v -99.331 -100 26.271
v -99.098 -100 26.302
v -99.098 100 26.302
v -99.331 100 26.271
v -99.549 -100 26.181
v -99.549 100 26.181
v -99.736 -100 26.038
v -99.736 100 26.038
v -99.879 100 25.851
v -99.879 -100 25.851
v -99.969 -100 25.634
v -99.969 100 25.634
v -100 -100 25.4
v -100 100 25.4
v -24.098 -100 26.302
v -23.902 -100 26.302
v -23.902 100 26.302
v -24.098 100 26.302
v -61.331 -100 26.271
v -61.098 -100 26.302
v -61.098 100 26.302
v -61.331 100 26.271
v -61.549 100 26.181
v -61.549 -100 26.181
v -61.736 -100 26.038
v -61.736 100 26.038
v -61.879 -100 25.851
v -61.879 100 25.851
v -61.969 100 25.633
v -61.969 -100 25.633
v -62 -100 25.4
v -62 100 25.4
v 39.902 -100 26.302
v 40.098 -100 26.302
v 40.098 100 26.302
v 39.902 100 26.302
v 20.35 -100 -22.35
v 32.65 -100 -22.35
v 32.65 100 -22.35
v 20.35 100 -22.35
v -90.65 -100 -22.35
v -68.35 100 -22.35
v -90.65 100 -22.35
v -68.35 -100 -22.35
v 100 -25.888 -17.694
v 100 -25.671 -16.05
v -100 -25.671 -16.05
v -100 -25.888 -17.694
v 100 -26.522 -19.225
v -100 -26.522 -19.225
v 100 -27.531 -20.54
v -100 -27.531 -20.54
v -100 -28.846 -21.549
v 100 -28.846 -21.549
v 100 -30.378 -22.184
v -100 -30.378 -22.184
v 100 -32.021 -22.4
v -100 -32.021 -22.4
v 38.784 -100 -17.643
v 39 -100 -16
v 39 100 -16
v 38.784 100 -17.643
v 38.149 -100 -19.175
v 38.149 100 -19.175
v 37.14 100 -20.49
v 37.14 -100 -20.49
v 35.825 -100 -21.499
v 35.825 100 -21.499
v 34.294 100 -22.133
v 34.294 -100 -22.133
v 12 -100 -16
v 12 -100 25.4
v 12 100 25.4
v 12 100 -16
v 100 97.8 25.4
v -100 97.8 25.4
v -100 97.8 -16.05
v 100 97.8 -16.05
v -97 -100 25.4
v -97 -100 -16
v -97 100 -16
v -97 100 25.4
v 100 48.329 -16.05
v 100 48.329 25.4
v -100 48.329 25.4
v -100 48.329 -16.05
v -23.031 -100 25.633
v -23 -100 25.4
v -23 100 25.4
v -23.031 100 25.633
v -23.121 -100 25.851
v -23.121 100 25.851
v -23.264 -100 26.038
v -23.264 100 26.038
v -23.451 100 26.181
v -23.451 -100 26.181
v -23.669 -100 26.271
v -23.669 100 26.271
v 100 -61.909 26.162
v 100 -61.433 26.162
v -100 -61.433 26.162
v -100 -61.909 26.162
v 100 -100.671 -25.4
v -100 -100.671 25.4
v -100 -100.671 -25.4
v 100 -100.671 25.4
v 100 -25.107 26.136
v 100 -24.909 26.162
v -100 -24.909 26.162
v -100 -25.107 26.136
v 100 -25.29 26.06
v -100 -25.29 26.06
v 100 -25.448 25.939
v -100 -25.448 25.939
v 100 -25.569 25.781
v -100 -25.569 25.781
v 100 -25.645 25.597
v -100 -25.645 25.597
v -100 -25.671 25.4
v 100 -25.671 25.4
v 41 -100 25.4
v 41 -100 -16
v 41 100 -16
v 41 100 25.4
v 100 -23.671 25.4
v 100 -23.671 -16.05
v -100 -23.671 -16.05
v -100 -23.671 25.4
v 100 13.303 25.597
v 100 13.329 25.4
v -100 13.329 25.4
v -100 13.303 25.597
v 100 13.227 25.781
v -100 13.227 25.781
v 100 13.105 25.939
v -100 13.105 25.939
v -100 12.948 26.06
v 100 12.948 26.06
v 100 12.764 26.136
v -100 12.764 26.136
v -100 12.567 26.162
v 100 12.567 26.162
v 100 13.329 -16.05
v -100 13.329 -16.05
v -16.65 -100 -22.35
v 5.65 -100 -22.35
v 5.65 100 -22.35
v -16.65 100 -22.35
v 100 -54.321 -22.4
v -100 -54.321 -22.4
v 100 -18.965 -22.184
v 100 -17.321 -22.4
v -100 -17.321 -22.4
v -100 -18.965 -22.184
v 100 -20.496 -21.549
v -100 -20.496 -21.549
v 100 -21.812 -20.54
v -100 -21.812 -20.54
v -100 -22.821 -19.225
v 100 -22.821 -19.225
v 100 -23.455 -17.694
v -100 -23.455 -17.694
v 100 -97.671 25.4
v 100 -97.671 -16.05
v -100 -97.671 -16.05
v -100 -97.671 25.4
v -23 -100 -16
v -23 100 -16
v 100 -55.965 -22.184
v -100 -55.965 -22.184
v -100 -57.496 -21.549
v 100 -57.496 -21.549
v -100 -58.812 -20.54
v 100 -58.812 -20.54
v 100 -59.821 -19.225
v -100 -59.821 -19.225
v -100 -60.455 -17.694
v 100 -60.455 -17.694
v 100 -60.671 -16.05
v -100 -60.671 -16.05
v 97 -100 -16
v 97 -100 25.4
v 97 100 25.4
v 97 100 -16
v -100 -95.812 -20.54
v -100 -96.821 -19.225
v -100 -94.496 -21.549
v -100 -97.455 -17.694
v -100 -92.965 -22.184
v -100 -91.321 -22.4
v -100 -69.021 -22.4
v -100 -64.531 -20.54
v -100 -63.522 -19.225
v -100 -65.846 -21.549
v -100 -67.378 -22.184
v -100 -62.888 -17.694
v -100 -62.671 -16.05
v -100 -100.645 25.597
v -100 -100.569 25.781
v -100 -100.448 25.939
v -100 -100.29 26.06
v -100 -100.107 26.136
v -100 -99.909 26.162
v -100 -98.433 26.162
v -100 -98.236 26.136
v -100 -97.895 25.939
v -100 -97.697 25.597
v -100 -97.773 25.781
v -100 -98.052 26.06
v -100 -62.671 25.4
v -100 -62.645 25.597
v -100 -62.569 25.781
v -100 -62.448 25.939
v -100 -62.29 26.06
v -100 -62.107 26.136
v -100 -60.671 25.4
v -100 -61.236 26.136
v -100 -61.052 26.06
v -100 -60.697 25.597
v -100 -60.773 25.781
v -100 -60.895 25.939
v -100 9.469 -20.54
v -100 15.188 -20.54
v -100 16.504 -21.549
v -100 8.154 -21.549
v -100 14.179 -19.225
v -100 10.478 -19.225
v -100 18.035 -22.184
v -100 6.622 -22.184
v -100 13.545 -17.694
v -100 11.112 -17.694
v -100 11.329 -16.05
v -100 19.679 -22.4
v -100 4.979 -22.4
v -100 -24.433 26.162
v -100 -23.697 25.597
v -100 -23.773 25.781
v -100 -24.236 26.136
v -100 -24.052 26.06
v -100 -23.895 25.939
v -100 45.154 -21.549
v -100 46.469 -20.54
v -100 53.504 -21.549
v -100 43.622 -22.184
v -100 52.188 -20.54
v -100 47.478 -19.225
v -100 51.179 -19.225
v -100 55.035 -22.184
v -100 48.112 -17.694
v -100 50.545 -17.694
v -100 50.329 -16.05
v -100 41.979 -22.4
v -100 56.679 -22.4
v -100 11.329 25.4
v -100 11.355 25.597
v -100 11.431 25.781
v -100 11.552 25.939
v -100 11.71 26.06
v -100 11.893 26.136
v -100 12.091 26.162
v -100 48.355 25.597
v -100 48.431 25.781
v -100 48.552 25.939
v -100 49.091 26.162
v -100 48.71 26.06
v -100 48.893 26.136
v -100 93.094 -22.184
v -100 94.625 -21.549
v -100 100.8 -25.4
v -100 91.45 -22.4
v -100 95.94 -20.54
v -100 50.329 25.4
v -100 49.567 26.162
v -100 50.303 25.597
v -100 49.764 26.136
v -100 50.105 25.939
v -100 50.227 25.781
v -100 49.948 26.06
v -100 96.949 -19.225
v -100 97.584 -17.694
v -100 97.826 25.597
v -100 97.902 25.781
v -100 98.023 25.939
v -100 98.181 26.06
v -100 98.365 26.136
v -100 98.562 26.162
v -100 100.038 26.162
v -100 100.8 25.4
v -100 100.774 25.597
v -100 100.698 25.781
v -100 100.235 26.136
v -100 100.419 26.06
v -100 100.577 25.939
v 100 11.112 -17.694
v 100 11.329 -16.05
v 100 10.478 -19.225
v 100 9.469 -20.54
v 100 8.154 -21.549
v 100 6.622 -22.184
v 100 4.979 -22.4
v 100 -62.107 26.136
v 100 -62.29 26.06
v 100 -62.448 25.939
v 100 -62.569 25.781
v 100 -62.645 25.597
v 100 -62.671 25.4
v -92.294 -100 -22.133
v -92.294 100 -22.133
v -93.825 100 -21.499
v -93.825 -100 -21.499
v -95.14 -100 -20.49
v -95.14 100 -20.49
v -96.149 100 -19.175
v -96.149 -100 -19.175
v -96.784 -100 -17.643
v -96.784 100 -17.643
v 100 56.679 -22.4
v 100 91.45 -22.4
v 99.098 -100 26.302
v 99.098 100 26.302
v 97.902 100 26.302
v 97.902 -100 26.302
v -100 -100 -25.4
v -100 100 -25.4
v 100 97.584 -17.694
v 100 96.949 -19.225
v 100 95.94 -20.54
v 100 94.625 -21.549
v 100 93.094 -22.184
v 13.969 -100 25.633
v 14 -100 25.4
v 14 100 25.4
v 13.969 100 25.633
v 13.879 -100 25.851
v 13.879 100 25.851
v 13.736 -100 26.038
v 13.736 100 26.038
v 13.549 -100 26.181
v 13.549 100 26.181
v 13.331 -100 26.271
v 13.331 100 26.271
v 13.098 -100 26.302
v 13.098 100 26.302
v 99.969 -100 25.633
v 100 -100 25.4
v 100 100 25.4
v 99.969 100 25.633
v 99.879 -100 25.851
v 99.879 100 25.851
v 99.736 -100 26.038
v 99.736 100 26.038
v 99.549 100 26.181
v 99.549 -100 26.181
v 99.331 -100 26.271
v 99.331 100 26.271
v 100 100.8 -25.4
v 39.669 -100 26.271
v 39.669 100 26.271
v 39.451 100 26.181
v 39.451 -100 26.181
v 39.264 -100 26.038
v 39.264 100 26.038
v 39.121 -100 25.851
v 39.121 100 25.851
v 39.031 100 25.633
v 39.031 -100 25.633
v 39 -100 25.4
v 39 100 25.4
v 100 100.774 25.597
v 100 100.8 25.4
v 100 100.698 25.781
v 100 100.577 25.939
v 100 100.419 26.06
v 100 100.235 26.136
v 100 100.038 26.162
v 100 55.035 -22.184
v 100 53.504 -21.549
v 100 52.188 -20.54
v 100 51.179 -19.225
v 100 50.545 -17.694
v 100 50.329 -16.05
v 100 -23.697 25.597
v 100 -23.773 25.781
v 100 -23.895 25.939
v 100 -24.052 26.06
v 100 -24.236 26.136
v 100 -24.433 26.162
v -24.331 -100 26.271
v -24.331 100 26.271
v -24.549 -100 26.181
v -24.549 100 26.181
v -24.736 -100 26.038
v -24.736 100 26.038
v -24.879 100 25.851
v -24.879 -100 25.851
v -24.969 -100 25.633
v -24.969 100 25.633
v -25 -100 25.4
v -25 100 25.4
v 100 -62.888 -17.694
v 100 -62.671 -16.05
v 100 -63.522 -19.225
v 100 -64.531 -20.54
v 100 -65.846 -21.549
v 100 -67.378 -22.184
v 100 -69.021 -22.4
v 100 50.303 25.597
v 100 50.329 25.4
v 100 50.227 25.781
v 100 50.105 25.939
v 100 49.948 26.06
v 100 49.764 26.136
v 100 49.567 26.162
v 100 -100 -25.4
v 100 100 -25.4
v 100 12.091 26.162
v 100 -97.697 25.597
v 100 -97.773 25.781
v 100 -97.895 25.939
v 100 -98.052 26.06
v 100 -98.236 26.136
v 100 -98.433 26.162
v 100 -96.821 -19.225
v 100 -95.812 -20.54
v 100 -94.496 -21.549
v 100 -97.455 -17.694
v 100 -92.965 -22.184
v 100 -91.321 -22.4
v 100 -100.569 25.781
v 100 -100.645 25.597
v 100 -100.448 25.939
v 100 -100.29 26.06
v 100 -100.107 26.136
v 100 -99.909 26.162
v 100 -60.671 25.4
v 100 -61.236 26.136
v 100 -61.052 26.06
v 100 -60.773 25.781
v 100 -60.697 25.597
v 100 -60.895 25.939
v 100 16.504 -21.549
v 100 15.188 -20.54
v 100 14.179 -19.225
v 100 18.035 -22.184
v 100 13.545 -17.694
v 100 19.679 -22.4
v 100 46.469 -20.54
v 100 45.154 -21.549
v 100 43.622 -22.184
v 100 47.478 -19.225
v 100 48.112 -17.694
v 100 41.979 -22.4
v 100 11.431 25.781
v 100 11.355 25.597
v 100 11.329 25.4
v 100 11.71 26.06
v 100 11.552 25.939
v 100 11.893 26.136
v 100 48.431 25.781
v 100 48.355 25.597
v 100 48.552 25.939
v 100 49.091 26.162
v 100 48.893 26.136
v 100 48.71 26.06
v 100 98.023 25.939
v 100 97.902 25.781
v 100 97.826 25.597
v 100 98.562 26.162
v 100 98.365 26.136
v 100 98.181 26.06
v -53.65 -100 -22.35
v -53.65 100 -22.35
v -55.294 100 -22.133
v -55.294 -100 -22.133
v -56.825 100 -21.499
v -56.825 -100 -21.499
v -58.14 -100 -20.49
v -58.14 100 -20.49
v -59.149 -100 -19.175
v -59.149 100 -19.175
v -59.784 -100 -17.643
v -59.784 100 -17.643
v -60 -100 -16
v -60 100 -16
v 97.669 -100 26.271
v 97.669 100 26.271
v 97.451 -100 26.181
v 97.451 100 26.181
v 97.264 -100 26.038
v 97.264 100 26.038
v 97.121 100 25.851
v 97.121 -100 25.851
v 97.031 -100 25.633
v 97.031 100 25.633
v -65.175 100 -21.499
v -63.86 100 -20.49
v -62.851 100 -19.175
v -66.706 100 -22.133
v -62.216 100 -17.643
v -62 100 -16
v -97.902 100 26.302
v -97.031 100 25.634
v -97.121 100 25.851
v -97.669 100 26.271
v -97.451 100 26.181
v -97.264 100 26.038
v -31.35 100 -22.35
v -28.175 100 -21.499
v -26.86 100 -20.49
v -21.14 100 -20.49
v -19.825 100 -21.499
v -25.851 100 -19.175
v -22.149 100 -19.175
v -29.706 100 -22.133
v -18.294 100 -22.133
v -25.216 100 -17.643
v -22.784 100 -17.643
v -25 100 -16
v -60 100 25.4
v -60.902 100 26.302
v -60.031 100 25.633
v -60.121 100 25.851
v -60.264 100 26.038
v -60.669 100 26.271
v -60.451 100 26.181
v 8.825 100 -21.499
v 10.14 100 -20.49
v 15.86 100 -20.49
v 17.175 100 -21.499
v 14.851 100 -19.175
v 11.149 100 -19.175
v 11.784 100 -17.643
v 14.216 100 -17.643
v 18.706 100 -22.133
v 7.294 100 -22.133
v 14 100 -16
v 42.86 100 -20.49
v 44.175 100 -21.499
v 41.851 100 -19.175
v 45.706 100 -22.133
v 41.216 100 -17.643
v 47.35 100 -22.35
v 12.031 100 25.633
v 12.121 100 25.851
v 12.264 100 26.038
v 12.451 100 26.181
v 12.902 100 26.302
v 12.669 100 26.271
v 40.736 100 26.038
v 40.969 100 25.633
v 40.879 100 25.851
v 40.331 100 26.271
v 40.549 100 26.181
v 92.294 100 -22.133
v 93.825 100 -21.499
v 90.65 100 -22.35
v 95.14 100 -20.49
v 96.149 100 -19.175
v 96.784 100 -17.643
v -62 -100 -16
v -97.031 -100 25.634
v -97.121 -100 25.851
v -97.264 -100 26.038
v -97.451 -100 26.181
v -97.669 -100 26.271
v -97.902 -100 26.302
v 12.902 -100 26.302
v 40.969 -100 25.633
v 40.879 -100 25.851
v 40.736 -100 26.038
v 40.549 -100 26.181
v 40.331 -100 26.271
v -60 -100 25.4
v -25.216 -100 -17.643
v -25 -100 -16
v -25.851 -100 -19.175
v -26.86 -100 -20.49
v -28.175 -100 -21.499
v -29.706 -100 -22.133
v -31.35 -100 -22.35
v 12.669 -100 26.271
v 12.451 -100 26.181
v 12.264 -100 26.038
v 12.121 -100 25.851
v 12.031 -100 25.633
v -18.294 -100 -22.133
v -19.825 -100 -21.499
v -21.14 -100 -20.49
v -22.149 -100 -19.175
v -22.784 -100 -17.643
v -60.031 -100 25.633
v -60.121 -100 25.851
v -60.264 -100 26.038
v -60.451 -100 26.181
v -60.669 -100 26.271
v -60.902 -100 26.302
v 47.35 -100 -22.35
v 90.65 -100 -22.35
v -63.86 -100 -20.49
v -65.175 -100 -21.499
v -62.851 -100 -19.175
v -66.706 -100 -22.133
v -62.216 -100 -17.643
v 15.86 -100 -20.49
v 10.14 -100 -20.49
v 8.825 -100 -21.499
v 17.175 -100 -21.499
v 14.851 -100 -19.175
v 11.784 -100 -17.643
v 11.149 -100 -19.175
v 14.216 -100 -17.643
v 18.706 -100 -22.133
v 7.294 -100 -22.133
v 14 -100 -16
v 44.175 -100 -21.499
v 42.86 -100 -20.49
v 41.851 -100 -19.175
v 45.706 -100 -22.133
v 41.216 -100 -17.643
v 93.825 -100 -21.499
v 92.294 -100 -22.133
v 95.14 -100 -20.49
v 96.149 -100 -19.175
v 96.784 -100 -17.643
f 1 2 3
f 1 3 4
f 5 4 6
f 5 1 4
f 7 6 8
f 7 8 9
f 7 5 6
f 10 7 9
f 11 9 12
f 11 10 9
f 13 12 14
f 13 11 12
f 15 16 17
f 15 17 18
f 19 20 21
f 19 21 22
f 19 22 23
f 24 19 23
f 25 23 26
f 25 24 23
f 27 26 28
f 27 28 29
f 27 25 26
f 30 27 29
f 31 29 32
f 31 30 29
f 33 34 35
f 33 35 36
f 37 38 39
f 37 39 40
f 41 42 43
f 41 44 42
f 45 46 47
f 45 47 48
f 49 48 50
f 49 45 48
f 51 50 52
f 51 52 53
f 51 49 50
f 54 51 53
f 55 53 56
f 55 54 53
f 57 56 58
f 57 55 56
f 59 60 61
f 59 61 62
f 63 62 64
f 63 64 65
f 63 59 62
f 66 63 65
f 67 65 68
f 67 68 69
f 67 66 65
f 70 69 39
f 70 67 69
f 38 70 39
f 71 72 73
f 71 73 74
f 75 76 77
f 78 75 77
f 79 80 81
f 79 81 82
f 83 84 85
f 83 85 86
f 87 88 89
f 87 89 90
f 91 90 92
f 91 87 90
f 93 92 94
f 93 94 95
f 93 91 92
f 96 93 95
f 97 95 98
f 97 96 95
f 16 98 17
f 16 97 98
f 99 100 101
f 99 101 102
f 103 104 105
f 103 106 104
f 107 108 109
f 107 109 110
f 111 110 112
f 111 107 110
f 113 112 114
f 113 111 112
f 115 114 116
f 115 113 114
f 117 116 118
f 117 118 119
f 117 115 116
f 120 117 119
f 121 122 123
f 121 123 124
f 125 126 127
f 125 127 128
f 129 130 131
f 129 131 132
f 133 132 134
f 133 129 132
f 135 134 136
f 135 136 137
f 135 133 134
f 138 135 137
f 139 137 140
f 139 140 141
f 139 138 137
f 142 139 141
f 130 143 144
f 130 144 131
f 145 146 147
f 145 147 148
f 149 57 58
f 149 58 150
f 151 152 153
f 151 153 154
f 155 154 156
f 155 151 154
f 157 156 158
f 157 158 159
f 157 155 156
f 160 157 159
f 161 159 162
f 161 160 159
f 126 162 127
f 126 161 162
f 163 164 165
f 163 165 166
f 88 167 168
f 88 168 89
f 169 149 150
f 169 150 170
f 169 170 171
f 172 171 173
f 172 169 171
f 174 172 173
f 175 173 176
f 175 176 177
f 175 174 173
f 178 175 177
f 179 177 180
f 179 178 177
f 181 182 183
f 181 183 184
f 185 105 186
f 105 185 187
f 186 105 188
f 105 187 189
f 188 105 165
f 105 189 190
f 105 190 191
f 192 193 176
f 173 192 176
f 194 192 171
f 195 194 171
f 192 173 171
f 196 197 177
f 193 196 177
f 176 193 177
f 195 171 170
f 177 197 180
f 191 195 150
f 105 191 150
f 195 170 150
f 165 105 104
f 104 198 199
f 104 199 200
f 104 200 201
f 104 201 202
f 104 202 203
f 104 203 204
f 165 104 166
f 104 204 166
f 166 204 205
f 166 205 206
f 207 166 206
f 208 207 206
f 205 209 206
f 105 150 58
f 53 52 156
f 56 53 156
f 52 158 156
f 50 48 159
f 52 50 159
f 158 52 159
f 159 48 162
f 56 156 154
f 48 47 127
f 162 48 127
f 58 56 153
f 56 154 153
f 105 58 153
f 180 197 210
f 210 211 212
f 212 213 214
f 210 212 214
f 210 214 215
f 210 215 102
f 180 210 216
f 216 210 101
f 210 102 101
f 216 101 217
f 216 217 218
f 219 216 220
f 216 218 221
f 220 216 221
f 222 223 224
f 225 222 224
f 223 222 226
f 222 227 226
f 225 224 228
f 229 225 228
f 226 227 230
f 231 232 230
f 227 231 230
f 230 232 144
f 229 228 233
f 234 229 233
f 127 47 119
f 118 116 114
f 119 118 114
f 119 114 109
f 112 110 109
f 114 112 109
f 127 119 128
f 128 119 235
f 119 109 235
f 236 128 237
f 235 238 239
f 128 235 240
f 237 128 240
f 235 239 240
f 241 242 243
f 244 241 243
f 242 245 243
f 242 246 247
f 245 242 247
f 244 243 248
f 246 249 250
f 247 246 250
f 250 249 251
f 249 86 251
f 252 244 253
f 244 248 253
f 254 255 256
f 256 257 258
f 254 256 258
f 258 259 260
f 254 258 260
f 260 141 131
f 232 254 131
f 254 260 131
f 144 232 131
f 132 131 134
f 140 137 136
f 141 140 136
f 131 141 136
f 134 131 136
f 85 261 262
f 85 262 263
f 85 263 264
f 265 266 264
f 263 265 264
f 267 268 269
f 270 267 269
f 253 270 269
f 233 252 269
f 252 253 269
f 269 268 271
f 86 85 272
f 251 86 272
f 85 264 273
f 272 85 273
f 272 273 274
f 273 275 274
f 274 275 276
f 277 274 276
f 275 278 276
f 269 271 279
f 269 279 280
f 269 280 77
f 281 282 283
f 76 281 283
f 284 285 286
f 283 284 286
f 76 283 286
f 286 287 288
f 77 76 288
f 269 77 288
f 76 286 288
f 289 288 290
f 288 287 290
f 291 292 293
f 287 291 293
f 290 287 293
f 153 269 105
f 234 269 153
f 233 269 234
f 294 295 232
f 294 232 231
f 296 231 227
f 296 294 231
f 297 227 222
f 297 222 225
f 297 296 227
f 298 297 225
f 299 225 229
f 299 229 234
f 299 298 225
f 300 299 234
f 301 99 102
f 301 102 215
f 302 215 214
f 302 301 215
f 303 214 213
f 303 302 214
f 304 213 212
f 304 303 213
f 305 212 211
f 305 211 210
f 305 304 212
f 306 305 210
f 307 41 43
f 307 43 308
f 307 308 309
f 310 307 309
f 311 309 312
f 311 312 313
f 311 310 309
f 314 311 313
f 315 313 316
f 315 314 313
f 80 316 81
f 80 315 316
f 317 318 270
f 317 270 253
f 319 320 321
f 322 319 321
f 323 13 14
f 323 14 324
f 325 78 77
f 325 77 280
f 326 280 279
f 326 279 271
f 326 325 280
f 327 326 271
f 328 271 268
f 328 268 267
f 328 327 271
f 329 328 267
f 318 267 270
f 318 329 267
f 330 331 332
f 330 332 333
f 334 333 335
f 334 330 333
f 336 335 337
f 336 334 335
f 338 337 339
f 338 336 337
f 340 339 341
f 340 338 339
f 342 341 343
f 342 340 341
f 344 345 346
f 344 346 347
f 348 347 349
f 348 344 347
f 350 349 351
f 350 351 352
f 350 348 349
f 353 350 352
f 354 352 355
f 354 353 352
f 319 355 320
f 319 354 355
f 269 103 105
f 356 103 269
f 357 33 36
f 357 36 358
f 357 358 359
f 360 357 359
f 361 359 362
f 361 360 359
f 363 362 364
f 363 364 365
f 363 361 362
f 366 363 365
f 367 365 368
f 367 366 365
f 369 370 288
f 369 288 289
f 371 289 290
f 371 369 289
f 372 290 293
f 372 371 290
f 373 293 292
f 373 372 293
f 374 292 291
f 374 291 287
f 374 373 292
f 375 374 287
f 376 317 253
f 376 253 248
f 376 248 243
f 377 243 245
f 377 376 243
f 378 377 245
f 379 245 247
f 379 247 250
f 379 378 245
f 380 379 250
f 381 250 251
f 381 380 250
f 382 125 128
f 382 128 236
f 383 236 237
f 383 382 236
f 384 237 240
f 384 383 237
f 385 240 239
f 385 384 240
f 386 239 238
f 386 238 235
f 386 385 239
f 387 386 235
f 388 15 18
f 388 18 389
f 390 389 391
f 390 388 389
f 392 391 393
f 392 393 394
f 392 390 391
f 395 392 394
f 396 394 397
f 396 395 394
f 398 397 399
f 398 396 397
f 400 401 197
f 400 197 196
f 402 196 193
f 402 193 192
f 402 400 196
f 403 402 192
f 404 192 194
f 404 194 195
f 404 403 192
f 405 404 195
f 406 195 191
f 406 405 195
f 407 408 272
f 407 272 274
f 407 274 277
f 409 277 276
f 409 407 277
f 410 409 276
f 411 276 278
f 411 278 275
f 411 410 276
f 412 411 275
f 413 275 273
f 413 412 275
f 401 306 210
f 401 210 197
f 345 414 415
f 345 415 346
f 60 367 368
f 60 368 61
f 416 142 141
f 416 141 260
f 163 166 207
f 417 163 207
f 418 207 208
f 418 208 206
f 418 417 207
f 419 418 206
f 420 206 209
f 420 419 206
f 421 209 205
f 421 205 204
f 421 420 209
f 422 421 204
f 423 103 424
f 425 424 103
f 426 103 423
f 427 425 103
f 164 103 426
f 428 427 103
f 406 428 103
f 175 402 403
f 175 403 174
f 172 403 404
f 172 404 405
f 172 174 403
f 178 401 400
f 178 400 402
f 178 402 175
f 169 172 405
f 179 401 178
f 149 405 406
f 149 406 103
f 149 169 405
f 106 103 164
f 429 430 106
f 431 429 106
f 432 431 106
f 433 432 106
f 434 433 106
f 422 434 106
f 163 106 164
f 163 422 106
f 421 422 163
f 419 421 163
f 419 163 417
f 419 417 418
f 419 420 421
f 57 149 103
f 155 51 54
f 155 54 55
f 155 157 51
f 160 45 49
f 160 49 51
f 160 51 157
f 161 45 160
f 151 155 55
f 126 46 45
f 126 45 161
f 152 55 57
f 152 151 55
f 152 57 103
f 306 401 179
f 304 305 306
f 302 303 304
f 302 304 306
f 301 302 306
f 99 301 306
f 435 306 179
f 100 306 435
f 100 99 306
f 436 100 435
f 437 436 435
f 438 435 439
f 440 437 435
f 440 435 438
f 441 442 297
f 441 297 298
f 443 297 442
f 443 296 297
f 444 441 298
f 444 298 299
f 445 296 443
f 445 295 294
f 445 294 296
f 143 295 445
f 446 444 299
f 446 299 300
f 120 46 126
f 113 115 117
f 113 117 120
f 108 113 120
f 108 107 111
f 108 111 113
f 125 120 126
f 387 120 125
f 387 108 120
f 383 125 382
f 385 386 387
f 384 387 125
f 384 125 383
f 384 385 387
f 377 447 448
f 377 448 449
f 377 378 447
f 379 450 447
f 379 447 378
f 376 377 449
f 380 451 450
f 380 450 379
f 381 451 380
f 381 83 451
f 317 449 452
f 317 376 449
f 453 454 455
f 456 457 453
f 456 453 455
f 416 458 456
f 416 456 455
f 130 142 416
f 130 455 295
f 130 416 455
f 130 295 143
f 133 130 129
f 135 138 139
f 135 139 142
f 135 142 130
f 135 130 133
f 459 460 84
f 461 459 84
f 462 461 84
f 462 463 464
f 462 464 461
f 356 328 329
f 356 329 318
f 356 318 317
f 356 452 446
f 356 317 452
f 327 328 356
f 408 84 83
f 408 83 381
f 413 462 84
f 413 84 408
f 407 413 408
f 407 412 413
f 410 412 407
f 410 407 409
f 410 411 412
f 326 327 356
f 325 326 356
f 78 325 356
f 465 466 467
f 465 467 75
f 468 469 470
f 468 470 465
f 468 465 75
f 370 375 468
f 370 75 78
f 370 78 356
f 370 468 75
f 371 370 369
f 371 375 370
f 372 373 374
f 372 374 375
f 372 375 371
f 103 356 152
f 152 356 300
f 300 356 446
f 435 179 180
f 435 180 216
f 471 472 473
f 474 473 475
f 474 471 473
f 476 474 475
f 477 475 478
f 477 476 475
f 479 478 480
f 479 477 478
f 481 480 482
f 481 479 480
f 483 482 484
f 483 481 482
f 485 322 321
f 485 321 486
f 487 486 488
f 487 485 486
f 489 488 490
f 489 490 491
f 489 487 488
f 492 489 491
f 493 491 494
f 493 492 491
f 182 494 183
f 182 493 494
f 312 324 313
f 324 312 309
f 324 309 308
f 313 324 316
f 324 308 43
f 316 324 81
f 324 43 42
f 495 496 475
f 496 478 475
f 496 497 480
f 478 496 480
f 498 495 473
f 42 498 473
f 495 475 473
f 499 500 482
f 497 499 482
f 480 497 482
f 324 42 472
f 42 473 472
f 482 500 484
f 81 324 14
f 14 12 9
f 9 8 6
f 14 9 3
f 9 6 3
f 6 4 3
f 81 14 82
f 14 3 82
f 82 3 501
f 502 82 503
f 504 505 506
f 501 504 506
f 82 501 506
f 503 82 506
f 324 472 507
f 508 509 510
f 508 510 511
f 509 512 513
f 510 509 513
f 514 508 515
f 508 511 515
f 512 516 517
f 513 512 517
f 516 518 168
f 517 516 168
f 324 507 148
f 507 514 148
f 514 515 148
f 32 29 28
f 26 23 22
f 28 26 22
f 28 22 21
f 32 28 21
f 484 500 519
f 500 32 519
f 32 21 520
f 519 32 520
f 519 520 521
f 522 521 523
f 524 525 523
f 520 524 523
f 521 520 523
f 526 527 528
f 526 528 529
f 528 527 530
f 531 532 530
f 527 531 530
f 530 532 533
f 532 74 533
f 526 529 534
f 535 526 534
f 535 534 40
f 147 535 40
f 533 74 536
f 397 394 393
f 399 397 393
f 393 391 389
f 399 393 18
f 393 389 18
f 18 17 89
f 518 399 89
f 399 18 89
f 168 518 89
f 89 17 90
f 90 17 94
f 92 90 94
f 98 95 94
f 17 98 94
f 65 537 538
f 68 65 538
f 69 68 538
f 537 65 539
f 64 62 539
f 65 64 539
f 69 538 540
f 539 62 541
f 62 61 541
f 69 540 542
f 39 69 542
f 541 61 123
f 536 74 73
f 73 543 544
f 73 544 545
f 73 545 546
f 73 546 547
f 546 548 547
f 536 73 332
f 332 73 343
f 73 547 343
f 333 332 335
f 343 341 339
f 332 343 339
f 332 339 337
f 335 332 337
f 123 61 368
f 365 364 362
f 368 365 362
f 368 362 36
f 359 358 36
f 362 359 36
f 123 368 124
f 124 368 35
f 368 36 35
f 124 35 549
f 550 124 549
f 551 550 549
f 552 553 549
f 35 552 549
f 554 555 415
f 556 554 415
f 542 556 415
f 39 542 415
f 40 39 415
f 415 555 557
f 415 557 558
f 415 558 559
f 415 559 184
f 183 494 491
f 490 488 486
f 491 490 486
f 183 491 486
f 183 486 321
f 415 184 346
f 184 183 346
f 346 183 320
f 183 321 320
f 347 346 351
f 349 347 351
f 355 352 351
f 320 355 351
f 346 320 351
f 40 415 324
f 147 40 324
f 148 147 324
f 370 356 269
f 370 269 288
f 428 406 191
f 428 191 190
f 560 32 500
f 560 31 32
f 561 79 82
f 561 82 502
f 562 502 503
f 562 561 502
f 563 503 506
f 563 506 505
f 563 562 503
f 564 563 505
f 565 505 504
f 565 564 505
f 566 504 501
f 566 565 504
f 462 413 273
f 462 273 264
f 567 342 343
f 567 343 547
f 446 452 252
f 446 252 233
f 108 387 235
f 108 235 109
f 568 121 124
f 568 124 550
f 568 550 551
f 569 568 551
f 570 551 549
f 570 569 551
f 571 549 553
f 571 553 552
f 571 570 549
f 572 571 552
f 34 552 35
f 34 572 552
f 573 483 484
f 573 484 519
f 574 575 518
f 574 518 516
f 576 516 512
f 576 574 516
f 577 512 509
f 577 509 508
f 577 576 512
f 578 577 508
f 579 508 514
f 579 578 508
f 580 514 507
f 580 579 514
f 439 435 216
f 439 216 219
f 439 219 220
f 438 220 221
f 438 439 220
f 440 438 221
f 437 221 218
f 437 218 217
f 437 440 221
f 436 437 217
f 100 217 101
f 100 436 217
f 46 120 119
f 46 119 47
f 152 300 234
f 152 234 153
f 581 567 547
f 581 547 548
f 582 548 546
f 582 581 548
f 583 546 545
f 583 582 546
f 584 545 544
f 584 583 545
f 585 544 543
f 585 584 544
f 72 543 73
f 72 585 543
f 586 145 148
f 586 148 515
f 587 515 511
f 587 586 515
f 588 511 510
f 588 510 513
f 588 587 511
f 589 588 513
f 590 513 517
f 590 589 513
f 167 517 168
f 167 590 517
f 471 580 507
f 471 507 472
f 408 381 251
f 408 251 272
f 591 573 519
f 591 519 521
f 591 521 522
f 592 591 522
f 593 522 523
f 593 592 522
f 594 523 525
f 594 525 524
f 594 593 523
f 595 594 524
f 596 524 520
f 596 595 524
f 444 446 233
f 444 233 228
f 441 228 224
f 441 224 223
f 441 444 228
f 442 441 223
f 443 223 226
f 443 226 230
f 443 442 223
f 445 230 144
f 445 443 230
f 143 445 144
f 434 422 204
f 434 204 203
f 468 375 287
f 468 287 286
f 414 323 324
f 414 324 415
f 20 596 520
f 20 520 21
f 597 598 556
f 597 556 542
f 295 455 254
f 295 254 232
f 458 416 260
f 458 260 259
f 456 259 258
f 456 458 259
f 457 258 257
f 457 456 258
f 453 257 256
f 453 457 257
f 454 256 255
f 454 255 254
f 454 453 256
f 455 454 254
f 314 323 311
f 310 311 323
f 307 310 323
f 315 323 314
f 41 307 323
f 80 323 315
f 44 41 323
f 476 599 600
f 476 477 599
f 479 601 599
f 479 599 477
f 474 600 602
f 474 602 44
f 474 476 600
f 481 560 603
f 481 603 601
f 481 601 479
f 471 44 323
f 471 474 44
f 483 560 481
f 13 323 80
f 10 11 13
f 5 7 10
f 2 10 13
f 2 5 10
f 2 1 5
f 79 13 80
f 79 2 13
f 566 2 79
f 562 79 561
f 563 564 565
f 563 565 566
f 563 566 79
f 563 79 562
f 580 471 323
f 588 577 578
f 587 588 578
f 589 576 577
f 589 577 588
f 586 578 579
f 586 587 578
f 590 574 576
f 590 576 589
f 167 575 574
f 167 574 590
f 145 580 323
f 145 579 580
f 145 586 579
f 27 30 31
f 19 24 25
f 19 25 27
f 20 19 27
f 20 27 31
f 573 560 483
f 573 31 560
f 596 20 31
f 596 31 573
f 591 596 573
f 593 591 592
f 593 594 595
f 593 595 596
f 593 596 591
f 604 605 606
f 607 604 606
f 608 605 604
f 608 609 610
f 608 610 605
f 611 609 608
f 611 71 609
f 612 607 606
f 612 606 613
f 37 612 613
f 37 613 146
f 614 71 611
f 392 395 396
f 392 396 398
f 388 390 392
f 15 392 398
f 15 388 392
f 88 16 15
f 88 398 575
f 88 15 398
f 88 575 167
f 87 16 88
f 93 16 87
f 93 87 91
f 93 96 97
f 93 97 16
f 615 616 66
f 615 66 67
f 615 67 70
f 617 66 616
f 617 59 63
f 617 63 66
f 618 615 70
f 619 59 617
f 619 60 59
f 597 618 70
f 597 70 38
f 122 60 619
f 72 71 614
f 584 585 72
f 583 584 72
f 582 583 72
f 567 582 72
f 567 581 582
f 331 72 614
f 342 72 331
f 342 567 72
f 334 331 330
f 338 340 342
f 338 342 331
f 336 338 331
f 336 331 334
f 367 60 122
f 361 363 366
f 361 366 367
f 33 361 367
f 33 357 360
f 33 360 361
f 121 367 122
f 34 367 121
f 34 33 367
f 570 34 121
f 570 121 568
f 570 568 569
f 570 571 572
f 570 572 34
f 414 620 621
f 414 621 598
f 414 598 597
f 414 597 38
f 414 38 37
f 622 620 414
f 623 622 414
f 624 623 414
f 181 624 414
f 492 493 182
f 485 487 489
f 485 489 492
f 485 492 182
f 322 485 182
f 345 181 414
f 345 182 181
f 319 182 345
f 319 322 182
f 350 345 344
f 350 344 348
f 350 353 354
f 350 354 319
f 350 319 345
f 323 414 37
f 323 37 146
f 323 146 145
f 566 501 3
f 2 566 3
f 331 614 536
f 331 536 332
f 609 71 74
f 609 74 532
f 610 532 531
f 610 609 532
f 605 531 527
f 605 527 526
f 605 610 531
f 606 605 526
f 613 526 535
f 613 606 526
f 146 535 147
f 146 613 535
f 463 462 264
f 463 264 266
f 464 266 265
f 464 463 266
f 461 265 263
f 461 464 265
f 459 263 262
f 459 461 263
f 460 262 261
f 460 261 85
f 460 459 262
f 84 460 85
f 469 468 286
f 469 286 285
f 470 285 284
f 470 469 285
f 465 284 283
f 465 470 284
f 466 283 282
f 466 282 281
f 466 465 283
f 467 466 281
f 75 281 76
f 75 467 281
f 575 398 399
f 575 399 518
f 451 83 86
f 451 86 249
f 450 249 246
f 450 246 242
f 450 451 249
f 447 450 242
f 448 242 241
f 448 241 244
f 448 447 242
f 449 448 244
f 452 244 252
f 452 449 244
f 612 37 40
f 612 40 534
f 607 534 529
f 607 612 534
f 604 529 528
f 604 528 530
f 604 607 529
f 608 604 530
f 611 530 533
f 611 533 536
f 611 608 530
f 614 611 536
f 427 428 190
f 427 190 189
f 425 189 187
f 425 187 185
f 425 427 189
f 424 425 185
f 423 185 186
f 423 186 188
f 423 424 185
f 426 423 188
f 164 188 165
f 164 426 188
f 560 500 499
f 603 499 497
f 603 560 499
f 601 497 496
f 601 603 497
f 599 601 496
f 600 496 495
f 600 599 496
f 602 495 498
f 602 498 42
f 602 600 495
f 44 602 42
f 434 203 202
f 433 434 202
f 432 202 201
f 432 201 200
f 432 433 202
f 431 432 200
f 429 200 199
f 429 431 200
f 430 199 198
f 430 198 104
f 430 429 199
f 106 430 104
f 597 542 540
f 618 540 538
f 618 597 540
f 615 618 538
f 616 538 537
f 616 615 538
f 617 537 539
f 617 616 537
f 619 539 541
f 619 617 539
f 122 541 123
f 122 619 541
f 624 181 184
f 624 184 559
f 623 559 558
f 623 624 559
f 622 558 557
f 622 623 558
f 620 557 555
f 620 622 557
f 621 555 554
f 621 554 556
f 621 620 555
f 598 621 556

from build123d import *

# Parameters (mm, degrees)
F2_DEPTH = 100
F3_DEPTH = 100


with BuildPart() as f2:
    # F0 (on Front) → F2 (new body, symmetric)
    with BuildSketch(Plane.XZ):
        with BuildLine():
            Line((-68.35, -22.349771), (-90.65, -22.349771))
            ThreePointArc((-90.65, -22.349771), (-95.140128, -20.489899), (-97, -15.999771))
            Line((-97, -15.999771), (-97, 25.4))
            ThreePointArc((-97, 25.4), (-97.264245, 26.037945), (-97.90219, 26.30219))
            Line((-97.90219, 26.30219), (-99.09781, 26.30219))
            ThreePointArc((-99.09781, 26.30219), (-99.735755, 26.037945), (-100, 25.4))
            Line((-100, 25.4), (-100, -25.4))
            Line((-100, -25.4), (100, -25.4))
            Line((100, -25.4), (100, 25.399994))
            ThreePointArc((100, 25.399994), (99.735755, 26.037939), (99.09781, 26.302184))
            Line((99.09781, 26.302184), (97.90219, 26.302184))
            ThreePointArc((97.90219, 26.302184), (97.264245, 26.037939), (97, 25.399994))
            Line((97, 25.399994), (97, -15.999771))
            ThreePointArc((97, -15.999771), (95.140128, -20.489899), (90.65, -22.349771))
            Line((90.65, -22.349771), (47.35, -22.349771))
            ThreePointArc((47.35, -22.349771), (42.859872, -20.489899), (41, -15.999771))
            Line((41, -15.999771), (41, 25.399994))
            ThreePointArc((41, 25.399994), (40.735755, 26.037939), (40.09781, 26.302184))
            Line((40.09781, 26.302184), (39.90219, 26.302184))
            ThreePointArc((39.90219, 26.302184), (39.264245, 26.037939), (39, 25.399994))
            Line((39, 25.399994), (39, -15.999771))
            ThreePointArc((39, -15.999771), (37.140128, -20.489899), (32.65, -22.349771))
            Line((32.65, -22.349771), (20.35, -22.349771))
            ThreePointArc((20.35, -22.349771), (15.859872, -20.489899), (14, -15.999771))
            Line((14, -15.999771), (14, 25.399994))
            ThreePointArc((14, 25.399994), (13.735755, 26.037939), (13.09781, 26.302184))
            Line((13.09781, 26.302184), (12.90219, 26.302184))
            ThreePointArc((12.90219, 26.302184), (12.264245, 26.037939), (12, 25.399994))
            Line((12, 25.399994), (12, -15.999771))
            ThreePointArc((12, -15.999771), (10.140128, -20.489899), (5.65, -22.349771))
            Line((5.65, -22.349771), (-16.65, -22.349771))
            ThreePointArc((-16.65, -22.349771), (-21.140128, -20.489899), (-23, -15.999771))
            Line((-23, -15.999771), (-23, 25.399994))
            ThreePointArc((-23, 25.399994), (-23.264245, 26.037939), (-23.90219, 26.302184))
            Line((-23.90219, 26.302184), (-24.09781, 26.302184))
            ThreePointArc((-24.09781, 26.302184), (-24.735755, 26.037939), (-25, 25.399994))
            Line((-25, 25.399994), (-25, -15.999771))
            ThreePointArc((-25, -15.999771), (-26.859872, -20.489899), (-31.35, -22.349771))
            Line((-31.35, -22.349771), (-53.65, -22.349771))
            ThreePointArc((-53.65, -22.349771), (-58.140128, -20.489899), (-60, -15.999771))
            Line((-60, -15.999771), (-60, 25.399994))
            ThreePointArc((-60, 25.399994), (-60.264245, 26.037939), (-60.90219, 26.302184))
            Line((-60.90219, 26.302184), (-61.09781, 26.302184))
            ThreePointArc((-61.09781, 26.302184), (-61.735755, 26.037939), (-62, 25.399994))
            Line((-62, 25.399994), (-62, -15.999771))
            ThreePointArc((-62, -15.999771), (-63.859872, -20.489899), (-68.35, -22.349771))
        make_face()
    extrude(amount=F2_DEPTH, both=True)


with BuildPart() as f3:
    # F1 (on Right) → F3 (new body, symmetric)
    with BuildSketch(Plane.YZ):
        with BuildLine():
            Line((-100.671373, -25.4), (99.328627, -25.4))
            Line((99.328627, -25.4), (100.8, -25.4))
            Line((100.8, -25.4), (100.8, 25.4))
            ThreePointArc((100.8, 25.4), (100.576833, 25.938773), (100.03806, 26.16194))
            Line((100.03806, 26.16194), (98.56194, 26.16194))
            ThreePointArc((98.56194, 26.16194), (98.023167, 25.938773), (97.8, 25.4))
            Line((97.8, 25.4), (97.8, -16.05))
            ThreePointArc((97.8, -16.05), (95.940128, -20.540128), (91.45, -22.4))
            Line((91.45, -22.4), (56.678627, -22.4))
            ThreePointArc((56.678627, -22.4), (52.188499, -20.540128), (50.328627, -16.05))
            Line((50.328627, -16.05), (50.328627, 25.400006))
            ThreePointArc((50.328627, 25.400006), (50.10546, 25.938779), (49.566687, 26.161946))
            Line((49.566687, 26.161946), (49.090567, 26.161946))
            ThreePointArc((49.090567, 26.161946), (48.551794, 25.938779), (48.328627, 25.400006))
            Line((48.328627, 25.400006), (48.328627, -16.05))
            ThreePointArc((48.328627, -16.05), (46.468755, -20.540128), (41.978627, -22.4))
            Line((41.978627, -22.4), (19.678627, -22.4))
            ThreePointArc((19.678627, -22.4), (15.188499, -20.540128), (13.328627, -16.05))
            Line((13.328627, -16.05), (13.328627, 25.400006))
            ThreePointArc((13.328627, 25.400006), (13.10546, 25.938779), (12.566687, 26.161946))
            Line((12.566687, 26.161946), (12.090567, 26.161946))
            ThreePointArc((12.090567, 26.161946), (11.551794, 25.938779), (11.328627, 25.400006))
            Line((11.328627, 25.400006), (11.328627, -16.05))
            ThreePointArc((11.328627, -16.05), (9.468755, -20.540128), (4.978627, -22.4))
            Line((4.978627, -22.4), (-17.321373, -22.4))
            ThreePointArc((-17.321373, -22.4), (-21.811501, -20.540128), (-23.671373, -16.05))
            Line((-23.671373, -16.05), (-23.671373, 25.400006))
            ThreePointArc((-23.671373, 25.400006), (-23.89454, 25.938779), (-24.433313, 26.161946))
            Line((-24.433313, 26.161946), (-24.909433, 26.161946))
            ThreePointArc((-24.909433, 26.161946), (-25.448206, 25.938779), (-25.671373, 25.400006))
            Line((-25.671373, 25.400006), (-25.671373, -16.05))
            ThreePointArc((-25.671373, -16.05), (-27.531245, -20.540128), (-32.021373, -22.4))
            Line((-32.021373, -22.4), (-54.321373, -22.4))
            ThreePointArc((-54.321373, -22.4), (-58.811501, -20.540128), (-60.671373, -16.05))
            Line((-60.671373, -16.05), (-60.671373, 25.400006))
            ThreePointArc((-60.671373, 25.400006), (-60.89454, 25.938779), (-61.433313, 26.161946))
            Line((-61.433313, 26.161946), (-61.909433, 26.161946))
            ThreePointArc((-61.909433, 26.161946), (-62.448206, 25.938779), (-62.671373, 25.400006))
            Line((-62.671373, 25.400006), (-62.671373, -16.05))
            ThreePointArc((-62.671373, -16.05), (-64.531245, -20.540128), (-69.021373, -22.4))
            Line((-69.021373, -22.4), (-91.321373, -22.4))
            ThreePointArc((-91.321373, -22.4), (-95.811501, -20.540128), (-97.671373, -16.05))
            Line((-97.671373, -16.05), (-97.671373, 25.400006))
            ThreePointArc((-97.671373, 25.400006), (-97.89454, 25.938779), (-98.433313, 26.161946))
            Line((-98.433313, 26.161946), (-99.909433, 26.161946))
            ThreePointArc((-99.909433, 26.161946), (-100.448206, 25.938779), (-100.671373, 25.400006))
            Line((-100.671373, 25.400006), (-100.671373, -25.4))
        make_face()
    extrude(amount=F3_DEPTH, both=True)


solid = Compound([f2.part, f3.part])
